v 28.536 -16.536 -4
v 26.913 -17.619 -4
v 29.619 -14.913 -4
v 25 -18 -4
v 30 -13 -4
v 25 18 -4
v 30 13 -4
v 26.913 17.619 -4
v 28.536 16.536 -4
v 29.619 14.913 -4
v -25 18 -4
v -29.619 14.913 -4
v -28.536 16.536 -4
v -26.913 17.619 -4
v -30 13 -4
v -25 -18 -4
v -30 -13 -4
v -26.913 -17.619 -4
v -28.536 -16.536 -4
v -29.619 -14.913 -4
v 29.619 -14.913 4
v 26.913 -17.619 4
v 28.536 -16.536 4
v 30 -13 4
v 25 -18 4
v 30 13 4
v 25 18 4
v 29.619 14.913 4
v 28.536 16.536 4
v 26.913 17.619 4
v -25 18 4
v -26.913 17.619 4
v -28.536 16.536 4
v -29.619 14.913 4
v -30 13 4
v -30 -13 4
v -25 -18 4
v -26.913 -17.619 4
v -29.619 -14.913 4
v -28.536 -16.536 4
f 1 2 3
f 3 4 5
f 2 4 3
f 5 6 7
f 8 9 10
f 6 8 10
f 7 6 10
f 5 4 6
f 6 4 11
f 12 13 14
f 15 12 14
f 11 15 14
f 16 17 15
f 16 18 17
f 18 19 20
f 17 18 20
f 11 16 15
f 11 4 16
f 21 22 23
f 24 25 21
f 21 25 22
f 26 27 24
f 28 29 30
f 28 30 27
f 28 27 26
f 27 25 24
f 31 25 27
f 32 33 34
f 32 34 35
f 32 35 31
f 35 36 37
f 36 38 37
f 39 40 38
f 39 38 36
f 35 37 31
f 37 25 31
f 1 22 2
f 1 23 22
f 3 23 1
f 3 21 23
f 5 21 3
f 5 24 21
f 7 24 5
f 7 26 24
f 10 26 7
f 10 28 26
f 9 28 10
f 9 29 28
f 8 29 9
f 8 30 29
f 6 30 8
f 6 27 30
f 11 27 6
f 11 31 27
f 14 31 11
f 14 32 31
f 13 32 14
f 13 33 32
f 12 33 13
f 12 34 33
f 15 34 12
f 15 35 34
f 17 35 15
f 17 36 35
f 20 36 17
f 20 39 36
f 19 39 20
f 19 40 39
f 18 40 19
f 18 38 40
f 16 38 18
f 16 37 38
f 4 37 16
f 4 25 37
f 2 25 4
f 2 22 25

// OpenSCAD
// Rounded Offset Profile
width = 60;
depth = 36;
corner_radius = 5;
thickness = 8;

module rounded_profile(size = [width, depth], r = corner_radius) {
  offset(r = r) {
    offset(delta = -r) {
      square(size, center = true);
    }
  }
}

linear_extrude(height = thickness, center = true) rounded_profile();
